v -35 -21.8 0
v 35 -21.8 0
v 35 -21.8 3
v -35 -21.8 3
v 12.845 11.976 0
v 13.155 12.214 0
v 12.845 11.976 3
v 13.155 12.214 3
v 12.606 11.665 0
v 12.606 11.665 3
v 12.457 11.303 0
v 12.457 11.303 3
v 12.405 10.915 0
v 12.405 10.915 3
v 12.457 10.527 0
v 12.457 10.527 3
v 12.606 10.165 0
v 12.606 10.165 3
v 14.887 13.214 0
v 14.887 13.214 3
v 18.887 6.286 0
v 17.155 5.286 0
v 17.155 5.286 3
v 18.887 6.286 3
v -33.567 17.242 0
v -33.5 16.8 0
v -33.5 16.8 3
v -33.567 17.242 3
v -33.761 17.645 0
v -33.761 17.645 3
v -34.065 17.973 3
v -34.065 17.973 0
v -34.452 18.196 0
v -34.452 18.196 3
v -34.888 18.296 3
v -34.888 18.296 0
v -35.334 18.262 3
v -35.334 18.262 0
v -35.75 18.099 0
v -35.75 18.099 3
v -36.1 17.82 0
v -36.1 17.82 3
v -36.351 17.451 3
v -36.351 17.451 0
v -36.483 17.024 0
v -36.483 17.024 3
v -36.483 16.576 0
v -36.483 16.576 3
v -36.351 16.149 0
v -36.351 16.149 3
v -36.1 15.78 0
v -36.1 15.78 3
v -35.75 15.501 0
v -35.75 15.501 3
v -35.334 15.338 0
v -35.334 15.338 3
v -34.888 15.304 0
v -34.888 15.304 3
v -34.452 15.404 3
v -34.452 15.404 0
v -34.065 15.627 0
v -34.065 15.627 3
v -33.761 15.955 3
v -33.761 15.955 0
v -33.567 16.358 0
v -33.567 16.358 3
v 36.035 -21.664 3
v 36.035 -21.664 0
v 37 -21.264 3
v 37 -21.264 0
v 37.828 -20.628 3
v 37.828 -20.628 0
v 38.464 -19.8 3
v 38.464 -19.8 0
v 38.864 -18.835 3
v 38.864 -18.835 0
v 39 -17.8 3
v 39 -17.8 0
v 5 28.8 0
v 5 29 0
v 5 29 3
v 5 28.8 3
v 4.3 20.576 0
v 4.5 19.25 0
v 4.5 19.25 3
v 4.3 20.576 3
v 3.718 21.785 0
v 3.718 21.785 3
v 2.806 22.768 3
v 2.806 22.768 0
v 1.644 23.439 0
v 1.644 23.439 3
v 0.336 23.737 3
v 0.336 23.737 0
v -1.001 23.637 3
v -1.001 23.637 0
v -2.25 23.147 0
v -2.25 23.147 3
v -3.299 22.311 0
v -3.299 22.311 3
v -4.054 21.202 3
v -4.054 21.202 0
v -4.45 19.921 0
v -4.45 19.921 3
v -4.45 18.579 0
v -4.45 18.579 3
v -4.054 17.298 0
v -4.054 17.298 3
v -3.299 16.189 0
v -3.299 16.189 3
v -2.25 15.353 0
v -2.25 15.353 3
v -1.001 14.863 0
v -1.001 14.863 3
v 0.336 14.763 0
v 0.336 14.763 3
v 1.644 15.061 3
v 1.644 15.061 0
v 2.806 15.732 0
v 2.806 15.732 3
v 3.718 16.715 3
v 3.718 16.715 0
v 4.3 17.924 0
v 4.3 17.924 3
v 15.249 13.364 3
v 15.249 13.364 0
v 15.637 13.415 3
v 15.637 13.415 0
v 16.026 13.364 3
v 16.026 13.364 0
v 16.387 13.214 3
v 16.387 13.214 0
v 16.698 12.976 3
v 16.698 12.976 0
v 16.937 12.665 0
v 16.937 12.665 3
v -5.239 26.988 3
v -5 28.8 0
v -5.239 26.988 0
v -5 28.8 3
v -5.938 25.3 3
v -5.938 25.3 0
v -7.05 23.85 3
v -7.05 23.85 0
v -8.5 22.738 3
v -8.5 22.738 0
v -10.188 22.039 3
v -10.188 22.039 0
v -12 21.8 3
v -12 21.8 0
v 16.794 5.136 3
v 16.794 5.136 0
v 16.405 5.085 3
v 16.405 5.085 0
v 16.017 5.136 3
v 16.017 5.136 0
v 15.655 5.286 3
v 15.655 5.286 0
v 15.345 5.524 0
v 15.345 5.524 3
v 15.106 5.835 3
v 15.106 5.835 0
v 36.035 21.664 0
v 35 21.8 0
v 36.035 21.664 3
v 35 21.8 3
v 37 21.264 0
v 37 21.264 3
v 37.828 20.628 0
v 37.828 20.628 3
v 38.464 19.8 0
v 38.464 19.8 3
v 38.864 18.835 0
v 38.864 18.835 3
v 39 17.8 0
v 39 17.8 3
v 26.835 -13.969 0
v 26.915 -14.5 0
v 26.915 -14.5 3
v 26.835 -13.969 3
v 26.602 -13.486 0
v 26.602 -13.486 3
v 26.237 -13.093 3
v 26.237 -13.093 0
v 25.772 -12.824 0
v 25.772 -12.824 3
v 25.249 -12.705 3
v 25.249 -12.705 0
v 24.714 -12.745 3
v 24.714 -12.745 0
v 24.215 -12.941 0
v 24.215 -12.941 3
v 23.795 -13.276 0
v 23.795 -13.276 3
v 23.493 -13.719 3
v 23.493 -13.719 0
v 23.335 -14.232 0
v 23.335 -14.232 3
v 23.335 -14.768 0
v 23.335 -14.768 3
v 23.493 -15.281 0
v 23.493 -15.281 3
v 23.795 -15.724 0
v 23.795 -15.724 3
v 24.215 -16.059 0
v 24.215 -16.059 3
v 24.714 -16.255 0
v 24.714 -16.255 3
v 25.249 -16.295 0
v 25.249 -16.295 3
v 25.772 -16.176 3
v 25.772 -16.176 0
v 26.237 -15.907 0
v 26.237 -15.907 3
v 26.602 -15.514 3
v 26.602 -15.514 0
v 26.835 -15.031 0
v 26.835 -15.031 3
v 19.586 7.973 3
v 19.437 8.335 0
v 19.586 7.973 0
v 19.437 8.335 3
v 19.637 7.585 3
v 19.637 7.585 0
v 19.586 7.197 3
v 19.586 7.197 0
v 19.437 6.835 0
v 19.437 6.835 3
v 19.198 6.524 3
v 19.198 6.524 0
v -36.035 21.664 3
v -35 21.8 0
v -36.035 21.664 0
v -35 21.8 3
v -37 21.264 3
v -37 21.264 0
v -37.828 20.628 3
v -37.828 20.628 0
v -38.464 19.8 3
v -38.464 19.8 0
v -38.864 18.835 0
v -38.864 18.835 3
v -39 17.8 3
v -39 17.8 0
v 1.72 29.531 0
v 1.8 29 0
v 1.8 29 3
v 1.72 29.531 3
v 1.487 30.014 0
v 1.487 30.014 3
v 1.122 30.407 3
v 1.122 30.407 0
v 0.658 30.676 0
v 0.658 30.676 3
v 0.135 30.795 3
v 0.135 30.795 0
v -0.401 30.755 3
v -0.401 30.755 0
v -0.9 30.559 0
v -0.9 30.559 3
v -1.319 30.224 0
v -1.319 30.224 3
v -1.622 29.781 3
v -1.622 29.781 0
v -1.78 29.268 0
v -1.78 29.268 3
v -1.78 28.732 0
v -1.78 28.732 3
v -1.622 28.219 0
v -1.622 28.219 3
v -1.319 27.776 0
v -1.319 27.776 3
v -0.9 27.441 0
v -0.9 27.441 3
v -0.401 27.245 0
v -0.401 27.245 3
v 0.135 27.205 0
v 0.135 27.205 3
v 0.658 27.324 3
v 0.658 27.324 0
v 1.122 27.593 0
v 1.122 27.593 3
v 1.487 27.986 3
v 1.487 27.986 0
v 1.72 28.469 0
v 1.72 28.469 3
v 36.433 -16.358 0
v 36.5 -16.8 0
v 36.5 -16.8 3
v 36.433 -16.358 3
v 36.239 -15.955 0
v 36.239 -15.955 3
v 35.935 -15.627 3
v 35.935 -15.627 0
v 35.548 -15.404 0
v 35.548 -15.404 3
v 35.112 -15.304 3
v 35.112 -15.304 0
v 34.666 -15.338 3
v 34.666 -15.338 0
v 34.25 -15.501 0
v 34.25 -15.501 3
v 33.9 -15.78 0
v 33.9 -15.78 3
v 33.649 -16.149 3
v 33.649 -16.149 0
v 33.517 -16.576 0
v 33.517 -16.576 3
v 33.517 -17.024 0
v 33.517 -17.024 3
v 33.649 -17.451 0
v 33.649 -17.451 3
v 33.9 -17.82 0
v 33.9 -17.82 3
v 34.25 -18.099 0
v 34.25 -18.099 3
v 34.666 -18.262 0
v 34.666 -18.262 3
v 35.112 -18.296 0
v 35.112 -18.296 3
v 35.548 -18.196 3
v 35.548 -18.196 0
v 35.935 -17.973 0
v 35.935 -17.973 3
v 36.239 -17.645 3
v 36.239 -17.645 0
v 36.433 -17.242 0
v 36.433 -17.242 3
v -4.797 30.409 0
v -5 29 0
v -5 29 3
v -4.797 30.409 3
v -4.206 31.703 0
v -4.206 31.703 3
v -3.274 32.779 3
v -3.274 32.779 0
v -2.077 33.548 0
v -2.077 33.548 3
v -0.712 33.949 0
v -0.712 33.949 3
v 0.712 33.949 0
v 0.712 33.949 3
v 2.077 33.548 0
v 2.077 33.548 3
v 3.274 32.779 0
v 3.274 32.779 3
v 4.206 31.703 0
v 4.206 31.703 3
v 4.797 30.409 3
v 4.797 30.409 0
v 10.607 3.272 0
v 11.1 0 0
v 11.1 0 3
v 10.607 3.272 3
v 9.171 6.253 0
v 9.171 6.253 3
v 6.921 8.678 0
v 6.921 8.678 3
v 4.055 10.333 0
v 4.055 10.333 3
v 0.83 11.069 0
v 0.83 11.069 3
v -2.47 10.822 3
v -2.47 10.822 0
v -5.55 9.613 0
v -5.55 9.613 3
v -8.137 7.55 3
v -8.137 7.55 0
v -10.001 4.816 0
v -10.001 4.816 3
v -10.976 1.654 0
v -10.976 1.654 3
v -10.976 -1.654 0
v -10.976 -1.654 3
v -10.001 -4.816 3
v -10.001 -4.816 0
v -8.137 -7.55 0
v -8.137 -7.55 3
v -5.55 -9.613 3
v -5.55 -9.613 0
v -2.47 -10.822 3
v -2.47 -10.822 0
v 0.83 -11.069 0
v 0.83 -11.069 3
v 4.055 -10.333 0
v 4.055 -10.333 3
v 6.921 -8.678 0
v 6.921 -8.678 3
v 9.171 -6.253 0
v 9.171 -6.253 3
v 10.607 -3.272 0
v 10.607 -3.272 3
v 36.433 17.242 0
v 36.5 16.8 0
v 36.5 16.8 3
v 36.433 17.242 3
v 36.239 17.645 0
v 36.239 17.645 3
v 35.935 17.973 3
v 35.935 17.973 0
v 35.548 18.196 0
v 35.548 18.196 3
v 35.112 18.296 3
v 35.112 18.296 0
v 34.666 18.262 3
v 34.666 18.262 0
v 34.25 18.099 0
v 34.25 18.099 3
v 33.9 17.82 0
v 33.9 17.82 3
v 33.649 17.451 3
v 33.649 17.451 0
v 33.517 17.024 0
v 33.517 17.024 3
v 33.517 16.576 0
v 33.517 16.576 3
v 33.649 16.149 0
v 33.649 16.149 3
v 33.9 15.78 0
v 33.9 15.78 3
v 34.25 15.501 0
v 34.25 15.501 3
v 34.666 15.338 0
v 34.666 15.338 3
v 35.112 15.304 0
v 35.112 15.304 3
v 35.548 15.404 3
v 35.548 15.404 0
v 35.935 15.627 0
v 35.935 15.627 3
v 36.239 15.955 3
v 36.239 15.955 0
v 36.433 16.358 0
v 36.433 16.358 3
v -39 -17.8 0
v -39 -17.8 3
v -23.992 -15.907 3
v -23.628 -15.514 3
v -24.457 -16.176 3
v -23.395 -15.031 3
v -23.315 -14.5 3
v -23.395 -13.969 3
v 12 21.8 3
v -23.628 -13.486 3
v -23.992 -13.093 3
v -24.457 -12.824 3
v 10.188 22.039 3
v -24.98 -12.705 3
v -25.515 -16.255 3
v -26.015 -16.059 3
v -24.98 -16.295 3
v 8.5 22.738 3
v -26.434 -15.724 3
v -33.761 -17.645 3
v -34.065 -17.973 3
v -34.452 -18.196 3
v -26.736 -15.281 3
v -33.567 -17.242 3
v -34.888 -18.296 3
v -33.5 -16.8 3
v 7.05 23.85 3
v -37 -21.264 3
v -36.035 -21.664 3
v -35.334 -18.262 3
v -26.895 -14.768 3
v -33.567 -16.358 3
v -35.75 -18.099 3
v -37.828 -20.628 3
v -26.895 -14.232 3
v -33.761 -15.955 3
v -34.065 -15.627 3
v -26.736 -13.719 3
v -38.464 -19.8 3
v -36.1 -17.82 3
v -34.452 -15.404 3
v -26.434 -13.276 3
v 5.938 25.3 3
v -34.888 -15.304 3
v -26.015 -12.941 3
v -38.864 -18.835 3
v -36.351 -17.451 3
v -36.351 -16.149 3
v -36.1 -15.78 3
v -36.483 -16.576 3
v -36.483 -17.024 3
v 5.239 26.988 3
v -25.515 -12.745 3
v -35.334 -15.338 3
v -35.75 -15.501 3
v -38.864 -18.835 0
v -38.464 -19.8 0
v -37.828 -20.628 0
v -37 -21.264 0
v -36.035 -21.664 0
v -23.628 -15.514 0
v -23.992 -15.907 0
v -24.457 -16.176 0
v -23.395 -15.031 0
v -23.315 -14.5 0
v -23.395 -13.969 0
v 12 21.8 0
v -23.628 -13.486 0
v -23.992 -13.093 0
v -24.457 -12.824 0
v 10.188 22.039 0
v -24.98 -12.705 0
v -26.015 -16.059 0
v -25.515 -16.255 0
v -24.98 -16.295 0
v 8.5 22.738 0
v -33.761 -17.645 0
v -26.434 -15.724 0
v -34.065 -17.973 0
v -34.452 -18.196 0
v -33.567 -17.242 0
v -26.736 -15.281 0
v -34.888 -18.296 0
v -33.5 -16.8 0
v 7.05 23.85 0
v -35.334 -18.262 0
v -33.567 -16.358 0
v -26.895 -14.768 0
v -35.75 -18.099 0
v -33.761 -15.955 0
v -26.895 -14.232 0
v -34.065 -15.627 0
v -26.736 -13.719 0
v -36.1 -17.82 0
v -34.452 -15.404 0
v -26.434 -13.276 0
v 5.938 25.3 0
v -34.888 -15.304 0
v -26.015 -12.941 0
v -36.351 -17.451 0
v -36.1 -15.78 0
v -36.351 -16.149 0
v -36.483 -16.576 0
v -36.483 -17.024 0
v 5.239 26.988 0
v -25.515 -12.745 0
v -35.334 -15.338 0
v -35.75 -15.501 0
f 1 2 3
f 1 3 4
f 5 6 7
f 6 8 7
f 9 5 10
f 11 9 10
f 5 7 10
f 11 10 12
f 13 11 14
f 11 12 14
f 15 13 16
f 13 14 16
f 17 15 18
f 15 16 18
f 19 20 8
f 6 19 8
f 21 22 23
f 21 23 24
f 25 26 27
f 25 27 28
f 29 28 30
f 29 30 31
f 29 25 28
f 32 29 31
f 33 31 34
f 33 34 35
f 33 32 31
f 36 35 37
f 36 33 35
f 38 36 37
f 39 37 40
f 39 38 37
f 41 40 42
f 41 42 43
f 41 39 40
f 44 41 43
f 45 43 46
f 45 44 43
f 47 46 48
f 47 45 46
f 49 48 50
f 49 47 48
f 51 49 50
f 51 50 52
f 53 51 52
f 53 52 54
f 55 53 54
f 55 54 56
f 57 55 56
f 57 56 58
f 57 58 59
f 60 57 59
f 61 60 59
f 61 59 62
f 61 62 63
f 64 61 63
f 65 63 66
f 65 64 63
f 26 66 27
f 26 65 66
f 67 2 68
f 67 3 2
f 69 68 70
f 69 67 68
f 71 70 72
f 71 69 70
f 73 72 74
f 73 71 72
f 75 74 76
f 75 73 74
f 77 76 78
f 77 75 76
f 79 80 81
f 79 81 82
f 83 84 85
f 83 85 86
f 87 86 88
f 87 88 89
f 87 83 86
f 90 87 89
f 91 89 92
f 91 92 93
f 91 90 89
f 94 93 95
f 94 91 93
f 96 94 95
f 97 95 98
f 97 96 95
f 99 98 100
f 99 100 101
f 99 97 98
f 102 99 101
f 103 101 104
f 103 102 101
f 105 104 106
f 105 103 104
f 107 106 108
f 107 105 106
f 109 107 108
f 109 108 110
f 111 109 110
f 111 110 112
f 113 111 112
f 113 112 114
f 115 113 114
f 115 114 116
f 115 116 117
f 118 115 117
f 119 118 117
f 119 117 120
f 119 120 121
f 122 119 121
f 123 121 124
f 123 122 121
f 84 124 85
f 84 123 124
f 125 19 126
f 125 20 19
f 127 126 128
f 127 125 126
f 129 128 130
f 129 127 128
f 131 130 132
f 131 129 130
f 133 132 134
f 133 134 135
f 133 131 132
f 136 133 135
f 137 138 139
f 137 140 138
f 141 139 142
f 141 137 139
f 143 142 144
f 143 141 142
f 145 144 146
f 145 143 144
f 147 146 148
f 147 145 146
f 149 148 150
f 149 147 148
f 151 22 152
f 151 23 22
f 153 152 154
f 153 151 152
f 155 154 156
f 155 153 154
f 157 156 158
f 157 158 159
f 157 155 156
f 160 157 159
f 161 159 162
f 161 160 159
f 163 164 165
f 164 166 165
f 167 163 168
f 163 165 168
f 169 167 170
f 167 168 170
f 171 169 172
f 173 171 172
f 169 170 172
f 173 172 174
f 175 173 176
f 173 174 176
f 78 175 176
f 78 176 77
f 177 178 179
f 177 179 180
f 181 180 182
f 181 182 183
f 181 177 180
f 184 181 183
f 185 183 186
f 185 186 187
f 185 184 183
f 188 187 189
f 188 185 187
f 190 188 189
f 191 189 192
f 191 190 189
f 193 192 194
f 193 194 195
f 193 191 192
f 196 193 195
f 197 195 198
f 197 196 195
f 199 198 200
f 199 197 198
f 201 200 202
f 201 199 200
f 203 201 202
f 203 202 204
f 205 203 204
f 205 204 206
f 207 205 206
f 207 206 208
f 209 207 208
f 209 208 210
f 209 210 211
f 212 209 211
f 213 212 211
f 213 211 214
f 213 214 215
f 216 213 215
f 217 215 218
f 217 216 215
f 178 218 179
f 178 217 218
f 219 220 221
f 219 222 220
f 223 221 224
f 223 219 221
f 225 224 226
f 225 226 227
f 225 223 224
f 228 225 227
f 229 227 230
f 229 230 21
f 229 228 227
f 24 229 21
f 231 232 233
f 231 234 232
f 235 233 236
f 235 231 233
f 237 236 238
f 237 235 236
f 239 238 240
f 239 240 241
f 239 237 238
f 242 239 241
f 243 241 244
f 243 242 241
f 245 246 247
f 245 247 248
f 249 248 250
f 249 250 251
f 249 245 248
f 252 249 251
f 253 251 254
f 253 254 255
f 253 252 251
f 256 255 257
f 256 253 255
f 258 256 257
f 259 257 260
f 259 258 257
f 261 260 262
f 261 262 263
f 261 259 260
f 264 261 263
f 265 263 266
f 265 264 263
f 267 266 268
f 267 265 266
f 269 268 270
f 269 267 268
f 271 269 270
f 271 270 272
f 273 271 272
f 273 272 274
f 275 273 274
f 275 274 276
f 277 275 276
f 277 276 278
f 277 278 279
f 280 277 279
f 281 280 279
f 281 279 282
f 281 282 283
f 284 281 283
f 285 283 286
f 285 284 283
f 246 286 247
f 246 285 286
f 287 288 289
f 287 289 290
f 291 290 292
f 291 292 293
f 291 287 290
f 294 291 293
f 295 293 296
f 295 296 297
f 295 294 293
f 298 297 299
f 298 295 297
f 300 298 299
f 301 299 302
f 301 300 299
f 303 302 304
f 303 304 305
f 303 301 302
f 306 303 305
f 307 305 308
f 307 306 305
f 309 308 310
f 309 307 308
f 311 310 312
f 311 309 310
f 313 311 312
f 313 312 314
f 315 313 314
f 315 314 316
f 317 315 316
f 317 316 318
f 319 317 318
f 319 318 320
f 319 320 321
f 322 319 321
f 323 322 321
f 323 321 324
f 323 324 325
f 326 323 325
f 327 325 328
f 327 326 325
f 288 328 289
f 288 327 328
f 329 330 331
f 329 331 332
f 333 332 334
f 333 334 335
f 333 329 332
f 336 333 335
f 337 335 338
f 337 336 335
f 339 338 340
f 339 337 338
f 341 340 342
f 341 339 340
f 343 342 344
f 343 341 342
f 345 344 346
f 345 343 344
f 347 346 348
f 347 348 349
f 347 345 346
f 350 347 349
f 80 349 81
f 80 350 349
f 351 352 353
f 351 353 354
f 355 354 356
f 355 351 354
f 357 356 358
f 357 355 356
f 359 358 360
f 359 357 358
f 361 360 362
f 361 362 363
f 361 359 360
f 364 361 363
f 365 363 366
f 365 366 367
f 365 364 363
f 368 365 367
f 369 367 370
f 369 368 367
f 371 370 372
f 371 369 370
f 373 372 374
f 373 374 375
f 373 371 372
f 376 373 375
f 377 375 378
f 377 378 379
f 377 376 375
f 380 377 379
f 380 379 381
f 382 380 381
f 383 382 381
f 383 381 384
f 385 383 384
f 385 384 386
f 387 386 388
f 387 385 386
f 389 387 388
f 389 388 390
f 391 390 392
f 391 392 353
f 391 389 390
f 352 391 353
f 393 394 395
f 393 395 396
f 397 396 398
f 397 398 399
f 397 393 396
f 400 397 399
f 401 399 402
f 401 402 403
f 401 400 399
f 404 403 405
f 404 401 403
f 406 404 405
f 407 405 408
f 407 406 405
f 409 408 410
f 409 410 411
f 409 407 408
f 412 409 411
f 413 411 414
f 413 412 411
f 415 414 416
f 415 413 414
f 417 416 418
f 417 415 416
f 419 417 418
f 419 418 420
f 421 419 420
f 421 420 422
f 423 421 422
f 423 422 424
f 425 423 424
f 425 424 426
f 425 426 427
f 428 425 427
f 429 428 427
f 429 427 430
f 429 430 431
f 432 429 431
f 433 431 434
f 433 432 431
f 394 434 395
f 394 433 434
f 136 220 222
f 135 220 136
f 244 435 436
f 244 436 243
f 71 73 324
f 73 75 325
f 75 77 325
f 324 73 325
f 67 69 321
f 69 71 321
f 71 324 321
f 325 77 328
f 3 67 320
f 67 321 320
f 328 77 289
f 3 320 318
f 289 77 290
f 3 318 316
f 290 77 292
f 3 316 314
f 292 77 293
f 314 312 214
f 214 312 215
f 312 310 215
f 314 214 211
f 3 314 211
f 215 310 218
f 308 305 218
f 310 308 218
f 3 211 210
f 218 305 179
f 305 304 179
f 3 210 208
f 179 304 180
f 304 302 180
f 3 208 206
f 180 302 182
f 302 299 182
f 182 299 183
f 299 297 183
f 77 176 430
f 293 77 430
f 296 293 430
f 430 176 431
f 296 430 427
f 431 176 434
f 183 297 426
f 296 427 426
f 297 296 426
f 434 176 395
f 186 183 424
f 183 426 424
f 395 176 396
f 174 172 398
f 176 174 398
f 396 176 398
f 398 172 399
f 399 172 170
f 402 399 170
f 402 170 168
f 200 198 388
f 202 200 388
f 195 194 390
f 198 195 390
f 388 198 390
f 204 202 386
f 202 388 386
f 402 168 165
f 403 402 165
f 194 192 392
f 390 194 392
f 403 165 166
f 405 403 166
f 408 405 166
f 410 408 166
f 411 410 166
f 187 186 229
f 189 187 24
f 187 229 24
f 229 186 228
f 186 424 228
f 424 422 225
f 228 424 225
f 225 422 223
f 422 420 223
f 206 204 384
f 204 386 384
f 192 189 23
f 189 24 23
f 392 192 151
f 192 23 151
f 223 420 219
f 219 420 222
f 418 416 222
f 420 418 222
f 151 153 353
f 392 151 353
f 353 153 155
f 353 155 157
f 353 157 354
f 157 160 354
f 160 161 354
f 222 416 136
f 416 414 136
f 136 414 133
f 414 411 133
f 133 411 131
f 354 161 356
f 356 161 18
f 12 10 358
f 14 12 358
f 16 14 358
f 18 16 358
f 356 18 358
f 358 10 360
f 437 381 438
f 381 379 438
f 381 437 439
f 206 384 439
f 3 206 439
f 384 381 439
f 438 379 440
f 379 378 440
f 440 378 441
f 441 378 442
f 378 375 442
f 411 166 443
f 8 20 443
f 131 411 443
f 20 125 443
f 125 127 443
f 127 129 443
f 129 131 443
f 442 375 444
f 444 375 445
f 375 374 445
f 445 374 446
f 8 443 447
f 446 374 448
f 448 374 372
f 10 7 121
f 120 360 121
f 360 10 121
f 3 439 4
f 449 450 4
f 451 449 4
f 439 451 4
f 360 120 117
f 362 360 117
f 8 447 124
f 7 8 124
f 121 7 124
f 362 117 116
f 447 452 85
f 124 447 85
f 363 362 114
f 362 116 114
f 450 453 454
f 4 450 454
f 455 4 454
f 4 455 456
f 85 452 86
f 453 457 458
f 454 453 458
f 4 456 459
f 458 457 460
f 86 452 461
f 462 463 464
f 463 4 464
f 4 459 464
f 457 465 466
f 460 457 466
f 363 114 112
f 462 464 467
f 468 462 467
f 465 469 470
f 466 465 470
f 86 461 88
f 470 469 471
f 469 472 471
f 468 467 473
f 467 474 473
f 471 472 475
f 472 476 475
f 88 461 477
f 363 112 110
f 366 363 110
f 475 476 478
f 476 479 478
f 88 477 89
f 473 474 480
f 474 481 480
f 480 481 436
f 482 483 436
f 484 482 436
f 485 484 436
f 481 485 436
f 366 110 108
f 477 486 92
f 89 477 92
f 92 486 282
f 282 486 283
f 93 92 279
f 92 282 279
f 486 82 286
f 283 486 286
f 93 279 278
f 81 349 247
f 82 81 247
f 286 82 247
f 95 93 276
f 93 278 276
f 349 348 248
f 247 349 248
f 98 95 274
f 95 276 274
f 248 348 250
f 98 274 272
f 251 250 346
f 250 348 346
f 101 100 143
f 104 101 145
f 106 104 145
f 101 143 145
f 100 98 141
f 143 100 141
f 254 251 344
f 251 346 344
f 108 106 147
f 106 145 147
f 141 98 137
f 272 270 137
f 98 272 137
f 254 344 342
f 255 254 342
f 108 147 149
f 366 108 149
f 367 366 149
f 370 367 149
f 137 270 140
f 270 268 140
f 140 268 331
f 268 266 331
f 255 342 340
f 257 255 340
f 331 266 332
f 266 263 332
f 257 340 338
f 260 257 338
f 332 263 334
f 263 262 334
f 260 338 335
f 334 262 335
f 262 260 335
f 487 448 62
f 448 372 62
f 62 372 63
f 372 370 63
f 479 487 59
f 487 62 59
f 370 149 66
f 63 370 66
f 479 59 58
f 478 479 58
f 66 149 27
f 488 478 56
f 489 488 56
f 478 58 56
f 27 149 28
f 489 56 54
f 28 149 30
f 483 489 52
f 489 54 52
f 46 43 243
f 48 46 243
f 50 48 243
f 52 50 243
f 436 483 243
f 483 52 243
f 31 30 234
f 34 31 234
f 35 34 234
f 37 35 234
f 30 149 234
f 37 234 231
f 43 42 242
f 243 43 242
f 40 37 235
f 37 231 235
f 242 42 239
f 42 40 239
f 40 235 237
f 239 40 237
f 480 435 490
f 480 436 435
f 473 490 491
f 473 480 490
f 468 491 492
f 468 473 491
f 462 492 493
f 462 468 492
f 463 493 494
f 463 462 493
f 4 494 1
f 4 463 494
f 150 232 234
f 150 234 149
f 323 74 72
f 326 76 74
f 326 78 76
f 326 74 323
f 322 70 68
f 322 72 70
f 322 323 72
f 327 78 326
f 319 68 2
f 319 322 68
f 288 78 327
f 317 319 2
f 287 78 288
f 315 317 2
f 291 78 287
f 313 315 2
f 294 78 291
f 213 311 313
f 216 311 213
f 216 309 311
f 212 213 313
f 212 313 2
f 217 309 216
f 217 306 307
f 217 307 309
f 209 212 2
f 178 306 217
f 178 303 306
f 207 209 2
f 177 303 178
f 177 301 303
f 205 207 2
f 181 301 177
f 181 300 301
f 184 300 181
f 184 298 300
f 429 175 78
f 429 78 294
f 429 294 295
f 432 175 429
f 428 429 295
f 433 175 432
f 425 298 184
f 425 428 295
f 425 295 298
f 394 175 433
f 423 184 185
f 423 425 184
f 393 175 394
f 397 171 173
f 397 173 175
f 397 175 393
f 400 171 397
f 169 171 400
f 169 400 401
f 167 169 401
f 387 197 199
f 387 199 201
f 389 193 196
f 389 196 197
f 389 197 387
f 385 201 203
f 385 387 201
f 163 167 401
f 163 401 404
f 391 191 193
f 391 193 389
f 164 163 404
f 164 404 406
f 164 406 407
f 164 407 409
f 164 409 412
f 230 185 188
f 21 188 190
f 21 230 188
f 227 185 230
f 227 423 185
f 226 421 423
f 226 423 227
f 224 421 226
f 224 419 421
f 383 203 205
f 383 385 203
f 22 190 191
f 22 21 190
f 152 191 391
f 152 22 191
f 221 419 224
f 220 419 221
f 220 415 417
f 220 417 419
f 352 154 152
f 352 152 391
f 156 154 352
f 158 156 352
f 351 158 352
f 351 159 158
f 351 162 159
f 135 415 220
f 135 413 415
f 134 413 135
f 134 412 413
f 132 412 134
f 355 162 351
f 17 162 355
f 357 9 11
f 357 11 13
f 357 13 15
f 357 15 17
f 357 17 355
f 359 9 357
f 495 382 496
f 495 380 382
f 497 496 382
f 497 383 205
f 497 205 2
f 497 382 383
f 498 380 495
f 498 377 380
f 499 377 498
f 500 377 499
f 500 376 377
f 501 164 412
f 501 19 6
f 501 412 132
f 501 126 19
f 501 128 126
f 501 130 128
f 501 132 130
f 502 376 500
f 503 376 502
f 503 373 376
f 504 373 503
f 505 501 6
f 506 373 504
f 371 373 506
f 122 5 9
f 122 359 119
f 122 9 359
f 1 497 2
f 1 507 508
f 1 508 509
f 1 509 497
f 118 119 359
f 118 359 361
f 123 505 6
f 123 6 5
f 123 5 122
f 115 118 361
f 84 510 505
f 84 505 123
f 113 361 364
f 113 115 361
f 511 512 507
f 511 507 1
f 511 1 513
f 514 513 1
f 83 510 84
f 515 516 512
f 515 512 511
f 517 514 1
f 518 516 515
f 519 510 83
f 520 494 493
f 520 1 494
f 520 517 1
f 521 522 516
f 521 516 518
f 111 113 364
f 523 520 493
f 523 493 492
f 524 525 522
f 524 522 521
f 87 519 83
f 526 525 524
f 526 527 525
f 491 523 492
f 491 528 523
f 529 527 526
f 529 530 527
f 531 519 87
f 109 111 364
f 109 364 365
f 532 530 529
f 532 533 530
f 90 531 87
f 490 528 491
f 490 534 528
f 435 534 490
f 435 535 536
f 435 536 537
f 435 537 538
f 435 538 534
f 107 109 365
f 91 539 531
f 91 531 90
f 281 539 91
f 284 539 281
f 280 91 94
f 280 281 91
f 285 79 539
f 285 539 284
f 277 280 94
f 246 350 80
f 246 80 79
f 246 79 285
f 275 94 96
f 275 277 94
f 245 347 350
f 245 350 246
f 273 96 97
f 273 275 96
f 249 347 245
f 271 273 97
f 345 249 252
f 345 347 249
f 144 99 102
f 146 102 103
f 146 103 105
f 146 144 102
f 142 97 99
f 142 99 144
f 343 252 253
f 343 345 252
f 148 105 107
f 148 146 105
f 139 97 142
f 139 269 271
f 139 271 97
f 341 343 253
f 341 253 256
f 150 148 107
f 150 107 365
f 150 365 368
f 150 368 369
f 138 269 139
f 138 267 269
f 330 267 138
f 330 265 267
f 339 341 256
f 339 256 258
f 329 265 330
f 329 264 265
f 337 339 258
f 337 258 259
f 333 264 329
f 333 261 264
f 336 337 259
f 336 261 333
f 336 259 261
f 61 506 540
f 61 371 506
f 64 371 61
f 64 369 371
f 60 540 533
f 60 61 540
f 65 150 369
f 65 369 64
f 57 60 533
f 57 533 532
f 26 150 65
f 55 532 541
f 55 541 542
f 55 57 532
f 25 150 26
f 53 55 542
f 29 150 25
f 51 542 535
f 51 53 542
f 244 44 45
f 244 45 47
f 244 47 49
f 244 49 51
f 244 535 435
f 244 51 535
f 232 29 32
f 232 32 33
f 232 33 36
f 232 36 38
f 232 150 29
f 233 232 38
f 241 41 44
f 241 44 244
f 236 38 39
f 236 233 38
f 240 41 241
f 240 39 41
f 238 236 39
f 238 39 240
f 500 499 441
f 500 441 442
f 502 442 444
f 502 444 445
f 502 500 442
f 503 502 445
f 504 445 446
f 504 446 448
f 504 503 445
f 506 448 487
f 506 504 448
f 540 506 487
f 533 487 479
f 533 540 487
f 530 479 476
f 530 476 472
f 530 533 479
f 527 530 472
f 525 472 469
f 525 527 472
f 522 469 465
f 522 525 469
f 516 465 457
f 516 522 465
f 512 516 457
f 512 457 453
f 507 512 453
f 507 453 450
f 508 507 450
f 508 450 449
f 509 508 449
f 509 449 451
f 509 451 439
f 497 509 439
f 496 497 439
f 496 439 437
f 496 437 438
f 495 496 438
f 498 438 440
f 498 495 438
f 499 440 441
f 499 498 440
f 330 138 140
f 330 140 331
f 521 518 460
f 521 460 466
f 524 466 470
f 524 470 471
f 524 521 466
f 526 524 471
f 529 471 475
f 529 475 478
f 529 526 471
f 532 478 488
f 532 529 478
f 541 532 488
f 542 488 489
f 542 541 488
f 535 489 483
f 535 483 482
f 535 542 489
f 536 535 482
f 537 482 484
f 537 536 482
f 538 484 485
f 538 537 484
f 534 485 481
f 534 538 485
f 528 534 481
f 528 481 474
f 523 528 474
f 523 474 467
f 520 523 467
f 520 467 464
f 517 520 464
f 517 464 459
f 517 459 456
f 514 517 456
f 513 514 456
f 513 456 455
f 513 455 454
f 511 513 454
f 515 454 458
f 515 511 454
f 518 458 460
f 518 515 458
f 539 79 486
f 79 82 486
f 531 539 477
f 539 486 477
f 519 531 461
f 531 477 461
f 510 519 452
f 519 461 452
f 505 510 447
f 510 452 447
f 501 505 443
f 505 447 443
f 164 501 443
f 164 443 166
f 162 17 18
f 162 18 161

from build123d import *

# Parameters (mm, degrees)
SKETCH_1_R      = 11.1
SKETCH_1_R_2    = 1.8
SKETCH_1_R_3    = 4.5
SKETCH_1_R_4    = 1.5
EXTRUDE_1_DEPTH = 3
FILLET_1_R      = 1.5
FILLET_2_R      = 7
FILLET_3_R      = 4


with BuildPart() as part:
    # 草图1 → 凸台-拉伸1 (new body)
    with BuildSketch(Plane.XY):
        with BuildLine():
            Line((-5, 21.8), (-5, 29))
            ThreePointArc((-5, 29), (0, 34), (5, 29))
            Line((5, 29), (5, 21.8))
            Line((5, 21.8), (39, 21.8))
            Line((39, 21.8), (39, -21.8))
            Line((39, -21.8), (-39, -21.8))
            Line((-39, -21.8), (-39, 21.8))
            Line((-39, 21.8), (-5, 21.8))
        make_face()
        Circle(SKETCH_1_R, mode=Mode.SUBTRACT)
        with Locations((0, 29)):
            Circle(SKETCH_1_R_2, mode=Mode.SUBTRACT)
        with Locations((25.11473671, -14.5)):
            Circle(SKETCH_1_R_2, mode=Mode.SUBTRACT)
        with Locations((-25.11473671, -14.5)):
            Circle(SKETCH_1_R_2, mode=Mode.SUBTRACT)
        with Locations((0, 19.25)):
            Circle(SKETCH_1_R_3, mode=Mode.SUBTRACT)
        with Locations((35, 16.8)):
            Circle(SKETCH_1_R_4, mode=Mode.SUBTRACT)
        with Locations((35, -16.8)):
            Circle(SKETCH_1_R_4, mode=Mode.SUBTRACT)
        with Locations((-35, 16.8)):
            Circle(SKETCH_1_R_4, mode=Mode.SUBTRACT)
        with Locations((-35, -16.8)):
            Circle(SKETCH_1_R_4, mode=Mode.SUBTRACT)
        Polygon((11.856406461, 11.464101615), (15.856406461, 4.535898385), (20.186533479, 7.035898385), (16.186533479, 13.964101615), align=None, mode=Mode.SUBTRACT)
    extrude(amount=EXTRUDE_1_DEPTH)

    # 圆角1
    fillet_1_edges = [part.edges().sort_by_distance(p)[0] for p in [
        (16.186533479, 13.964101615, 1.5),
        (11.856406461, 11.464101615, 1.5),
        (15.856406461, 4.535898385, 1.5),
        (20.186533479, 7.035898385, 1.5),
    ]]
    fillet(fillet_1_edges, radius=FILLET_1_R)

    # 圆角2
    fillet_2_edges = [part.edges().sort_by_distance(p)[0] for p in [
        (-5, 21.8, 1.5),
        (5, 21.8, 1.5),
    ]]
    fillet(fillet_2_edges, radius=FILLET_2_R)

    # 圆角3
    fillet_3_edges = [part.edges().sort_by_distance(p)[0] for p in [
        (39, 21.8, 1.5),
        (39, -21.8, 1.5),
        (-39, -21.8, 1.5),
        (-39, 21.8, 1.5),
    ]]
    fillet(fillet_3_edges, radius=FILLET_3_R)


solid = part.part
